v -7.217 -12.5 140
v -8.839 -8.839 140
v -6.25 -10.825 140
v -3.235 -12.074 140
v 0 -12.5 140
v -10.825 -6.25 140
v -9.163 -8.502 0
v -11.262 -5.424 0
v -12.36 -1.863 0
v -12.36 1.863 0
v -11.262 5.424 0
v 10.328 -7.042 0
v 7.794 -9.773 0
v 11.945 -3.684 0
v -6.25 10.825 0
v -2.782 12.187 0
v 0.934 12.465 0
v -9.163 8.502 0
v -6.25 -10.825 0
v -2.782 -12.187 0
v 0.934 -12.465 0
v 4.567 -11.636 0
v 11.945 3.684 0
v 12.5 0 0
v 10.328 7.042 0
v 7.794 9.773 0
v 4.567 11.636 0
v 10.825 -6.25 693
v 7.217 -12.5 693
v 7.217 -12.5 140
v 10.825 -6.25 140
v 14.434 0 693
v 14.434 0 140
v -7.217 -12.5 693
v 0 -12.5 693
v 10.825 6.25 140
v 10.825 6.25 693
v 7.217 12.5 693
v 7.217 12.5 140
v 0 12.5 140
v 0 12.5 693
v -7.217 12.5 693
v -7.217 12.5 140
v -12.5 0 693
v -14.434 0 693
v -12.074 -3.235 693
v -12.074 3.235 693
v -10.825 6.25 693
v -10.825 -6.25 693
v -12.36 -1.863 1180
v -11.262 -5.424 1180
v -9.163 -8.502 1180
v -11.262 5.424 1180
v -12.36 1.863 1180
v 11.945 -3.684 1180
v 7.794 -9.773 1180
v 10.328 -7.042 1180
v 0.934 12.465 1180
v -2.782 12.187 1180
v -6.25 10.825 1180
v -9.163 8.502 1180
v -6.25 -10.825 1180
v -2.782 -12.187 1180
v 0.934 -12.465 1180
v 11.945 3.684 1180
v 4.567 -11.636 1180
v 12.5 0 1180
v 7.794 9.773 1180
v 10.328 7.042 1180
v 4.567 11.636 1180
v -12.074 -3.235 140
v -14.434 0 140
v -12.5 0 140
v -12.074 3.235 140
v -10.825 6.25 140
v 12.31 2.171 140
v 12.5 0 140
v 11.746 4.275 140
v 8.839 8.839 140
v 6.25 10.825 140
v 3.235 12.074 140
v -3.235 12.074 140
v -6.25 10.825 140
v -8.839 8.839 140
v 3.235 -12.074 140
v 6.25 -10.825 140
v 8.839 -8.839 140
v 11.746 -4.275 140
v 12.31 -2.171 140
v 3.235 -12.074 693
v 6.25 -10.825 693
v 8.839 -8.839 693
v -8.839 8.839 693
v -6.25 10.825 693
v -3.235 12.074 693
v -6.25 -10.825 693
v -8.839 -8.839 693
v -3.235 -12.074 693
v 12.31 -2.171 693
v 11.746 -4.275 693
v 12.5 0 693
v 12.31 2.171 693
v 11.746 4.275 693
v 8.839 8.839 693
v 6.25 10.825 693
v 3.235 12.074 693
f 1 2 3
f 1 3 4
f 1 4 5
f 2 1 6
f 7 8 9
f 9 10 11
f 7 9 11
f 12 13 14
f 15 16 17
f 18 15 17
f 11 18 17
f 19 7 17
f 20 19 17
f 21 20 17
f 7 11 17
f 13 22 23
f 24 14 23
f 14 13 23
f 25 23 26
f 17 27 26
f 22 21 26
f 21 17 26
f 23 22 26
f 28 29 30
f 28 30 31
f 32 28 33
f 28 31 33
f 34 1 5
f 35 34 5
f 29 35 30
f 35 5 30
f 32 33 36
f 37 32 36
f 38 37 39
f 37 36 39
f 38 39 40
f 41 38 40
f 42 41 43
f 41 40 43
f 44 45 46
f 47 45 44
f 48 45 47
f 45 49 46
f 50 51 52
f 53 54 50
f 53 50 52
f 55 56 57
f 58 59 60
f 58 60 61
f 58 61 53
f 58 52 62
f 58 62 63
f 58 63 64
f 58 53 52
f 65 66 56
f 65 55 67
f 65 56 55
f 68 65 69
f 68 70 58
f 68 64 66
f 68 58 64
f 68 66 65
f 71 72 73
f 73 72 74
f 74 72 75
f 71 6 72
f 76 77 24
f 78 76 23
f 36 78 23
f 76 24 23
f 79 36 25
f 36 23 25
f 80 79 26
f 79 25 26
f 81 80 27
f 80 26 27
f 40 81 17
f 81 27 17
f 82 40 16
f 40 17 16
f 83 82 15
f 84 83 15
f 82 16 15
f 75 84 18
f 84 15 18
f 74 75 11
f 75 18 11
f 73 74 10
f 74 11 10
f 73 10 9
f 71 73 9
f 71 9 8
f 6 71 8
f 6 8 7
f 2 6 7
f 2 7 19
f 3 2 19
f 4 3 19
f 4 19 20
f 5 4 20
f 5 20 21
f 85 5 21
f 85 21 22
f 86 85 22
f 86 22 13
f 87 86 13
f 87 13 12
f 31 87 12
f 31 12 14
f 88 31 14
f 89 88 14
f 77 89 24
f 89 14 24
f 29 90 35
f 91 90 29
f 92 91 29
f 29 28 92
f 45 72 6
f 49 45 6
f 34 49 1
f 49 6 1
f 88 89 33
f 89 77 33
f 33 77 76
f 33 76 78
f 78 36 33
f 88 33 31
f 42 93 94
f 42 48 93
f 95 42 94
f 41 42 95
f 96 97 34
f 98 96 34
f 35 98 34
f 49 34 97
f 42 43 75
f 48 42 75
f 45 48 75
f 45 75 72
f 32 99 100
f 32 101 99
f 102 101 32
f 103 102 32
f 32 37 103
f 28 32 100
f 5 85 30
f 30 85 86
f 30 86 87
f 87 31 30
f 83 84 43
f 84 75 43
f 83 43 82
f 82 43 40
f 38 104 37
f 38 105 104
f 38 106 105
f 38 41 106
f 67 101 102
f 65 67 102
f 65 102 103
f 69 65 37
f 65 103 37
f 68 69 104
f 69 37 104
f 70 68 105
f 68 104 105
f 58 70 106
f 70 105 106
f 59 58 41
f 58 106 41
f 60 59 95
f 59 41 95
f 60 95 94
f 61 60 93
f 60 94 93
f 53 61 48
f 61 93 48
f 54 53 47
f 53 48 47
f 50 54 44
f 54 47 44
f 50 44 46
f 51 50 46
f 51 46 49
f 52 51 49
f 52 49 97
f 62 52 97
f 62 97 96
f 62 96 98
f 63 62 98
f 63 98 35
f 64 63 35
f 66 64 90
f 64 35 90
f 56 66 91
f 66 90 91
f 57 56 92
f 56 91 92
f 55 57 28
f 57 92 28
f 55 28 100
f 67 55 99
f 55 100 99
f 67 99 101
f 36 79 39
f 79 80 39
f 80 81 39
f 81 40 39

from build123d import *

# Parameters (mm, degrees)
F0_R     = 12.5
F1_DEPTH = 140
F3_DEPTH = 553
F4_R     = 12.5
F5_DEPTH = 487


with BuildPart() as f1:
    # F0 (on Top) → F1 (new body)
    with BuildSketch(Plane.XY):
        Circle(F0_R)
    extrude(amount=F1_DEPTH)

    # F2 (on face) → F3 (join)
    with BuildSketch(Plane.XY.offset(140)):
        Polygon((7.2168783649, 12.5), (-7.2168783649, 12.5), (-14.4337567297, 0), (-7.2168783649, -12.5), (7.2168783649, -12.5), (14.4337567297, 0), align=None)
    extrude(amount=F3_DEPTH)

    # F4 (on face) → F5 (join)
    with BuildSketch(Plane.XY.offset(693)):
        Circle(F4_R)
    extrude(amount=F5_DEPTH)


solid = f1.part
